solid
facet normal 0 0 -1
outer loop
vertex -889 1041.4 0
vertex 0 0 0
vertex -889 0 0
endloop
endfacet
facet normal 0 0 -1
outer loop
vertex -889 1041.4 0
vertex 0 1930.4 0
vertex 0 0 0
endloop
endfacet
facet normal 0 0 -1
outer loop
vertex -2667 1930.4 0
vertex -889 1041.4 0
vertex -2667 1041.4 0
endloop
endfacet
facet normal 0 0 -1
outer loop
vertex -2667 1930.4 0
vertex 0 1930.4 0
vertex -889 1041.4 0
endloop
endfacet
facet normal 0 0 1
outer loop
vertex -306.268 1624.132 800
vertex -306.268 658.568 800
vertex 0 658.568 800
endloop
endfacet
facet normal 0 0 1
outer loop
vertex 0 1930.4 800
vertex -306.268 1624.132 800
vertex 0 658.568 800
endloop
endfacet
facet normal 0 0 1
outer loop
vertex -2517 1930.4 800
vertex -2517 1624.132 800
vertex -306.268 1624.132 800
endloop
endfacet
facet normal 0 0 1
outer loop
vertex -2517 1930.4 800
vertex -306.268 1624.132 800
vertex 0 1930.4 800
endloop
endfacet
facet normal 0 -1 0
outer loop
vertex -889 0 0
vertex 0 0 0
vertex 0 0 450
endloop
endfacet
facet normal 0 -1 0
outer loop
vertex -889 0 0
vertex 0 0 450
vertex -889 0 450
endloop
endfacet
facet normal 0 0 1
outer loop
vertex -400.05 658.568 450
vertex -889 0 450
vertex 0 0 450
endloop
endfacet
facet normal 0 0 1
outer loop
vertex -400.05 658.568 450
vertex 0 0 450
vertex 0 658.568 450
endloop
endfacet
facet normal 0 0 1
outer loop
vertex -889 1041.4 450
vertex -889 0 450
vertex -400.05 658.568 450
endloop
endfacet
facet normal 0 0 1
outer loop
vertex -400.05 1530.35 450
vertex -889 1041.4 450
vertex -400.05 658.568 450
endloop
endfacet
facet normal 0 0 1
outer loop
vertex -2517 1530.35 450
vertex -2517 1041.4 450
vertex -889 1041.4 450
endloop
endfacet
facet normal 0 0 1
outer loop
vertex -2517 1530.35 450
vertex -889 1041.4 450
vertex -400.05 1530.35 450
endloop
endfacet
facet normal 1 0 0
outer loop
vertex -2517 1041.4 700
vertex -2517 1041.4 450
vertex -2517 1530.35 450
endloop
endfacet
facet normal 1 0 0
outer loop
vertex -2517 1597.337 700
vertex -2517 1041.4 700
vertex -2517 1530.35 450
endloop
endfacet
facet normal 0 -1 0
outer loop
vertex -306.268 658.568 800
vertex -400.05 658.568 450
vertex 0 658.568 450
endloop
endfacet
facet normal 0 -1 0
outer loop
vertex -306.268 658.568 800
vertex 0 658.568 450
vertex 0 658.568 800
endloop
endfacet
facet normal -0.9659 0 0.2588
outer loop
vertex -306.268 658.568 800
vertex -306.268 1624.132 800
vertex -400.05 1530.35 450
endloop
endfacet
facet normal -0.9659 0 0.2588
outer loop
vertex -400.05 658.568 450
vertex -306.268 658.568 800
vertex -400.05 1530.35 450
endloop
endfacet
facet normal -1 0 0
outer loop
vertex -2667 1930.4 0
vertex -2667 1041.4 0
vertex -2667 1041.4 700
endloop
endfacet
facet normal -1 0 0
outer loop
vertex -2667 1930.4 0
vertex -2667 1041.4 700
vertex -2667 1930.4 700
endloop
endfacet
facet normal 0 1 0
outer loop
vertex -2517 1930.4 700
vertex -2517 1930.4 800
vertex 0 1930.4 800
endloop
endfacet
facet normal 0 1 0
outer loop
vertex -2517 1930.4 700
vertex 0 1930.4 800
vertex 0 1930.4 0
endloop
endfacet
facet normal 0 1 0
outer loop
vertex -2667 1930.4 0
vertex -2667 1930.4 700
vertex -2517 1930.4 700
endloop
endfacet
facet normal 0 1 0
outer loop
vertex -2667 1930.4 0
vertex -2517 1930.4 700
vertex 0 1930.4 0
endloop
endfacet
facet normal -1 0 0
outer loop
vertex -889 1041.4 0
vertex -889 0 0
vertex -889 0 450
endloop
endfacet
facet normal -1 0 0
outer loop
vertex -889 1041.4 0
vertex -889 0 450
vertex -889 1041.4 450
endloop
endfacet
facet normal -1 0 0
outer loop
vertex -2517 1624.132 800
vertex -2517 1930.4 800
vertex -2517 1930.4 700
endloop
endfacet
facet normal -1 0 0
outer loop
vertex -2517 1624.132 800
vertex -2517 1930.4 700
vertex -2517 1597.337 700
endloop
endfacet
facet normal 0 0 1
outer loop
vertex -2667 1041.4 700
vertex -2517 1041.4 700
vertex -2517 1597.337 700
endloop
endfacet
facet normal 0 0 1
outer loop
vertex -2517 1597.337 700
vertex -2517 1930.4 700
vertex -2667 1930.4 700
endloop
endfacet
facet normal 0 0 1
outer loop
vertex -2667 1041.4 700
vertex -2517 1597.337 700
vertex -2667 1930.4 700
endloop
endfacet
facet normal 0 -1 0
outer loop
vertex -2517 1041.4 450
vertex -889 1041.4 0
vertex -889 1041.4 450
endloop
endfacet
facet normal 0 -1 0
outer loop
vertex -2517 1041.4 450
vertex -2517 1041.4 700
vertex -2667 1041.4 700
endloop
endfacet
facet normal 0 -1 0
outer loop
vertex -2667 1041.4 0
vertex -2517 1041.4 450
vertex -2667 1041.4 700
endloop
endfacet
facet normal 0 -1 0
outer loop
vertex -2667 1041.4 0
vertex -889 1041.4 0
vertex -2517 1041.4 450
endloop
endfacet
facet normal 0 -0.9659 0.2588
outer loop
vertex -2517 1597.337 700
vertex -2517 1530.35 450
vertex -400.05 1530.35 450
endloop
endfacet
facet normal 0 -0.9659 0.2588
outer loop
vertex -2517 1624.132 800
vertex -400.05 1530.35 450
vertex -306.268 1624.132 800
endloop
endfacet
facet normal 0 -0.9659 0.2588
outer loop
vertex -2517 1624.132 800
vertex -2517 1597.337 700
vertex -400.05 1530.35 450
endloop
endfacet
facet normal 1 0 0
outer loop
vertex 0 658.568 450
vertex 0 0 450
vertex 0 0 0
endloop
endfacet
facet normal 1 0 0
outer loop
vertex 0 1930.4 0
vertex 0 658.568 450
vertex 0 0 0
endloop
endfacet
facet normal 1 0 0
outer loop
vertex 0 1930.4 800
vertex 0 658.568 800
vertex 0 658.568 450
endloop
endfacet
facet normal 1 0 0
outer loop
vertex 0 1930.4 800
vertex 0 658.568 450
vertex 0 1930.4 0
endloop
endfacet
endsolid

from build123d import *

# Parameters (mm, degrees)
F1_DEPTH  = 450
F2_W      = 889
F2_H      = 150
F2_W_2    = 150
F2_H_2    = 889
F3_DEPTH  = 250
F5_DEPTH  = 1780.4
F8_W      = 658.5683822632
F8_H      = 350
F9_DEPTH  = 889.001
F11_W     = 3085.2428972721
F11_H     = 1244.7776794434
F12_DEPTH = 2667.001


with BuildPart() as f1:
    # F0 (on Top) → F1 (new body)
    with BuildSketch(Plane.XY):
        Polygon((0, 1930.4), (0, 0), (889, 0), (889, 1041.4), (2667, 1041.4), (2667, 1930.4), align=None)
    extrude(amount=F1_DEPTH)

    # F2 (on face) → F3 (join)
    with BuildSketch(Plane.XY.offset(450)):
        with Locations((444.5, 75)):
            Rectangle(F2_W, F2_H)
        with Locations((2592, 1485.9)):
            Rectangle(F2_W_2, F2_H_2)
    extrude(amount=F3_DEPTH)

    # F4 (on face) → F5 (join, through all)
    with BuildSketch(Plane(origin=(0, 150, 0), x_dir=(-1, 0, 0), z_dir=(0, 1, 0))):
        Polygon((-400.05, 450), (0, 450), (0, 800), (-306.2677826491, 800), align=None)
    extrude(amount=F5_DEPTH)

    # F6 (on face) → F7 (join, up to the next surface of F1)
    with BuildSketch(Plane(origin=(2517, 0, 0), x_dir=(0, -1, 0), z_dir=(-1, 0, 0))):
        Polygon((-1930.4, 800), (-1930.4, 450), (-1530.35, 450), (-1624.1322173509, 800), align=None)
    extrude(until=Until.NEXT)

    # F8 (on face) → F9 (cut, through all)
    with BuildSketch(Plane.YZ.offset(889)):
        with Locations((329.2841911316, 625)):
            Rectangle(F8_W, F8_H)
    extrude(amount=-F9_DEPTH, mode=Mode.SUBTRACT)

    # F10: F1 across plane


with BuildPart() as f1_1:
    add(f1.part)
    add(f1.part.mirror(Plane.YZ))

    # F11 (on Right) → F12 (cut, through all)
    with BuildSketch(Plane.YZ):
        with Locations((1233.0443114042, 330.7127356529)):
            Rectangle(F11_W, F11_H)
    extrude(amount=F12_DEPTH, mode=Mode.SUBTRACT)


solid = f1_1.part
